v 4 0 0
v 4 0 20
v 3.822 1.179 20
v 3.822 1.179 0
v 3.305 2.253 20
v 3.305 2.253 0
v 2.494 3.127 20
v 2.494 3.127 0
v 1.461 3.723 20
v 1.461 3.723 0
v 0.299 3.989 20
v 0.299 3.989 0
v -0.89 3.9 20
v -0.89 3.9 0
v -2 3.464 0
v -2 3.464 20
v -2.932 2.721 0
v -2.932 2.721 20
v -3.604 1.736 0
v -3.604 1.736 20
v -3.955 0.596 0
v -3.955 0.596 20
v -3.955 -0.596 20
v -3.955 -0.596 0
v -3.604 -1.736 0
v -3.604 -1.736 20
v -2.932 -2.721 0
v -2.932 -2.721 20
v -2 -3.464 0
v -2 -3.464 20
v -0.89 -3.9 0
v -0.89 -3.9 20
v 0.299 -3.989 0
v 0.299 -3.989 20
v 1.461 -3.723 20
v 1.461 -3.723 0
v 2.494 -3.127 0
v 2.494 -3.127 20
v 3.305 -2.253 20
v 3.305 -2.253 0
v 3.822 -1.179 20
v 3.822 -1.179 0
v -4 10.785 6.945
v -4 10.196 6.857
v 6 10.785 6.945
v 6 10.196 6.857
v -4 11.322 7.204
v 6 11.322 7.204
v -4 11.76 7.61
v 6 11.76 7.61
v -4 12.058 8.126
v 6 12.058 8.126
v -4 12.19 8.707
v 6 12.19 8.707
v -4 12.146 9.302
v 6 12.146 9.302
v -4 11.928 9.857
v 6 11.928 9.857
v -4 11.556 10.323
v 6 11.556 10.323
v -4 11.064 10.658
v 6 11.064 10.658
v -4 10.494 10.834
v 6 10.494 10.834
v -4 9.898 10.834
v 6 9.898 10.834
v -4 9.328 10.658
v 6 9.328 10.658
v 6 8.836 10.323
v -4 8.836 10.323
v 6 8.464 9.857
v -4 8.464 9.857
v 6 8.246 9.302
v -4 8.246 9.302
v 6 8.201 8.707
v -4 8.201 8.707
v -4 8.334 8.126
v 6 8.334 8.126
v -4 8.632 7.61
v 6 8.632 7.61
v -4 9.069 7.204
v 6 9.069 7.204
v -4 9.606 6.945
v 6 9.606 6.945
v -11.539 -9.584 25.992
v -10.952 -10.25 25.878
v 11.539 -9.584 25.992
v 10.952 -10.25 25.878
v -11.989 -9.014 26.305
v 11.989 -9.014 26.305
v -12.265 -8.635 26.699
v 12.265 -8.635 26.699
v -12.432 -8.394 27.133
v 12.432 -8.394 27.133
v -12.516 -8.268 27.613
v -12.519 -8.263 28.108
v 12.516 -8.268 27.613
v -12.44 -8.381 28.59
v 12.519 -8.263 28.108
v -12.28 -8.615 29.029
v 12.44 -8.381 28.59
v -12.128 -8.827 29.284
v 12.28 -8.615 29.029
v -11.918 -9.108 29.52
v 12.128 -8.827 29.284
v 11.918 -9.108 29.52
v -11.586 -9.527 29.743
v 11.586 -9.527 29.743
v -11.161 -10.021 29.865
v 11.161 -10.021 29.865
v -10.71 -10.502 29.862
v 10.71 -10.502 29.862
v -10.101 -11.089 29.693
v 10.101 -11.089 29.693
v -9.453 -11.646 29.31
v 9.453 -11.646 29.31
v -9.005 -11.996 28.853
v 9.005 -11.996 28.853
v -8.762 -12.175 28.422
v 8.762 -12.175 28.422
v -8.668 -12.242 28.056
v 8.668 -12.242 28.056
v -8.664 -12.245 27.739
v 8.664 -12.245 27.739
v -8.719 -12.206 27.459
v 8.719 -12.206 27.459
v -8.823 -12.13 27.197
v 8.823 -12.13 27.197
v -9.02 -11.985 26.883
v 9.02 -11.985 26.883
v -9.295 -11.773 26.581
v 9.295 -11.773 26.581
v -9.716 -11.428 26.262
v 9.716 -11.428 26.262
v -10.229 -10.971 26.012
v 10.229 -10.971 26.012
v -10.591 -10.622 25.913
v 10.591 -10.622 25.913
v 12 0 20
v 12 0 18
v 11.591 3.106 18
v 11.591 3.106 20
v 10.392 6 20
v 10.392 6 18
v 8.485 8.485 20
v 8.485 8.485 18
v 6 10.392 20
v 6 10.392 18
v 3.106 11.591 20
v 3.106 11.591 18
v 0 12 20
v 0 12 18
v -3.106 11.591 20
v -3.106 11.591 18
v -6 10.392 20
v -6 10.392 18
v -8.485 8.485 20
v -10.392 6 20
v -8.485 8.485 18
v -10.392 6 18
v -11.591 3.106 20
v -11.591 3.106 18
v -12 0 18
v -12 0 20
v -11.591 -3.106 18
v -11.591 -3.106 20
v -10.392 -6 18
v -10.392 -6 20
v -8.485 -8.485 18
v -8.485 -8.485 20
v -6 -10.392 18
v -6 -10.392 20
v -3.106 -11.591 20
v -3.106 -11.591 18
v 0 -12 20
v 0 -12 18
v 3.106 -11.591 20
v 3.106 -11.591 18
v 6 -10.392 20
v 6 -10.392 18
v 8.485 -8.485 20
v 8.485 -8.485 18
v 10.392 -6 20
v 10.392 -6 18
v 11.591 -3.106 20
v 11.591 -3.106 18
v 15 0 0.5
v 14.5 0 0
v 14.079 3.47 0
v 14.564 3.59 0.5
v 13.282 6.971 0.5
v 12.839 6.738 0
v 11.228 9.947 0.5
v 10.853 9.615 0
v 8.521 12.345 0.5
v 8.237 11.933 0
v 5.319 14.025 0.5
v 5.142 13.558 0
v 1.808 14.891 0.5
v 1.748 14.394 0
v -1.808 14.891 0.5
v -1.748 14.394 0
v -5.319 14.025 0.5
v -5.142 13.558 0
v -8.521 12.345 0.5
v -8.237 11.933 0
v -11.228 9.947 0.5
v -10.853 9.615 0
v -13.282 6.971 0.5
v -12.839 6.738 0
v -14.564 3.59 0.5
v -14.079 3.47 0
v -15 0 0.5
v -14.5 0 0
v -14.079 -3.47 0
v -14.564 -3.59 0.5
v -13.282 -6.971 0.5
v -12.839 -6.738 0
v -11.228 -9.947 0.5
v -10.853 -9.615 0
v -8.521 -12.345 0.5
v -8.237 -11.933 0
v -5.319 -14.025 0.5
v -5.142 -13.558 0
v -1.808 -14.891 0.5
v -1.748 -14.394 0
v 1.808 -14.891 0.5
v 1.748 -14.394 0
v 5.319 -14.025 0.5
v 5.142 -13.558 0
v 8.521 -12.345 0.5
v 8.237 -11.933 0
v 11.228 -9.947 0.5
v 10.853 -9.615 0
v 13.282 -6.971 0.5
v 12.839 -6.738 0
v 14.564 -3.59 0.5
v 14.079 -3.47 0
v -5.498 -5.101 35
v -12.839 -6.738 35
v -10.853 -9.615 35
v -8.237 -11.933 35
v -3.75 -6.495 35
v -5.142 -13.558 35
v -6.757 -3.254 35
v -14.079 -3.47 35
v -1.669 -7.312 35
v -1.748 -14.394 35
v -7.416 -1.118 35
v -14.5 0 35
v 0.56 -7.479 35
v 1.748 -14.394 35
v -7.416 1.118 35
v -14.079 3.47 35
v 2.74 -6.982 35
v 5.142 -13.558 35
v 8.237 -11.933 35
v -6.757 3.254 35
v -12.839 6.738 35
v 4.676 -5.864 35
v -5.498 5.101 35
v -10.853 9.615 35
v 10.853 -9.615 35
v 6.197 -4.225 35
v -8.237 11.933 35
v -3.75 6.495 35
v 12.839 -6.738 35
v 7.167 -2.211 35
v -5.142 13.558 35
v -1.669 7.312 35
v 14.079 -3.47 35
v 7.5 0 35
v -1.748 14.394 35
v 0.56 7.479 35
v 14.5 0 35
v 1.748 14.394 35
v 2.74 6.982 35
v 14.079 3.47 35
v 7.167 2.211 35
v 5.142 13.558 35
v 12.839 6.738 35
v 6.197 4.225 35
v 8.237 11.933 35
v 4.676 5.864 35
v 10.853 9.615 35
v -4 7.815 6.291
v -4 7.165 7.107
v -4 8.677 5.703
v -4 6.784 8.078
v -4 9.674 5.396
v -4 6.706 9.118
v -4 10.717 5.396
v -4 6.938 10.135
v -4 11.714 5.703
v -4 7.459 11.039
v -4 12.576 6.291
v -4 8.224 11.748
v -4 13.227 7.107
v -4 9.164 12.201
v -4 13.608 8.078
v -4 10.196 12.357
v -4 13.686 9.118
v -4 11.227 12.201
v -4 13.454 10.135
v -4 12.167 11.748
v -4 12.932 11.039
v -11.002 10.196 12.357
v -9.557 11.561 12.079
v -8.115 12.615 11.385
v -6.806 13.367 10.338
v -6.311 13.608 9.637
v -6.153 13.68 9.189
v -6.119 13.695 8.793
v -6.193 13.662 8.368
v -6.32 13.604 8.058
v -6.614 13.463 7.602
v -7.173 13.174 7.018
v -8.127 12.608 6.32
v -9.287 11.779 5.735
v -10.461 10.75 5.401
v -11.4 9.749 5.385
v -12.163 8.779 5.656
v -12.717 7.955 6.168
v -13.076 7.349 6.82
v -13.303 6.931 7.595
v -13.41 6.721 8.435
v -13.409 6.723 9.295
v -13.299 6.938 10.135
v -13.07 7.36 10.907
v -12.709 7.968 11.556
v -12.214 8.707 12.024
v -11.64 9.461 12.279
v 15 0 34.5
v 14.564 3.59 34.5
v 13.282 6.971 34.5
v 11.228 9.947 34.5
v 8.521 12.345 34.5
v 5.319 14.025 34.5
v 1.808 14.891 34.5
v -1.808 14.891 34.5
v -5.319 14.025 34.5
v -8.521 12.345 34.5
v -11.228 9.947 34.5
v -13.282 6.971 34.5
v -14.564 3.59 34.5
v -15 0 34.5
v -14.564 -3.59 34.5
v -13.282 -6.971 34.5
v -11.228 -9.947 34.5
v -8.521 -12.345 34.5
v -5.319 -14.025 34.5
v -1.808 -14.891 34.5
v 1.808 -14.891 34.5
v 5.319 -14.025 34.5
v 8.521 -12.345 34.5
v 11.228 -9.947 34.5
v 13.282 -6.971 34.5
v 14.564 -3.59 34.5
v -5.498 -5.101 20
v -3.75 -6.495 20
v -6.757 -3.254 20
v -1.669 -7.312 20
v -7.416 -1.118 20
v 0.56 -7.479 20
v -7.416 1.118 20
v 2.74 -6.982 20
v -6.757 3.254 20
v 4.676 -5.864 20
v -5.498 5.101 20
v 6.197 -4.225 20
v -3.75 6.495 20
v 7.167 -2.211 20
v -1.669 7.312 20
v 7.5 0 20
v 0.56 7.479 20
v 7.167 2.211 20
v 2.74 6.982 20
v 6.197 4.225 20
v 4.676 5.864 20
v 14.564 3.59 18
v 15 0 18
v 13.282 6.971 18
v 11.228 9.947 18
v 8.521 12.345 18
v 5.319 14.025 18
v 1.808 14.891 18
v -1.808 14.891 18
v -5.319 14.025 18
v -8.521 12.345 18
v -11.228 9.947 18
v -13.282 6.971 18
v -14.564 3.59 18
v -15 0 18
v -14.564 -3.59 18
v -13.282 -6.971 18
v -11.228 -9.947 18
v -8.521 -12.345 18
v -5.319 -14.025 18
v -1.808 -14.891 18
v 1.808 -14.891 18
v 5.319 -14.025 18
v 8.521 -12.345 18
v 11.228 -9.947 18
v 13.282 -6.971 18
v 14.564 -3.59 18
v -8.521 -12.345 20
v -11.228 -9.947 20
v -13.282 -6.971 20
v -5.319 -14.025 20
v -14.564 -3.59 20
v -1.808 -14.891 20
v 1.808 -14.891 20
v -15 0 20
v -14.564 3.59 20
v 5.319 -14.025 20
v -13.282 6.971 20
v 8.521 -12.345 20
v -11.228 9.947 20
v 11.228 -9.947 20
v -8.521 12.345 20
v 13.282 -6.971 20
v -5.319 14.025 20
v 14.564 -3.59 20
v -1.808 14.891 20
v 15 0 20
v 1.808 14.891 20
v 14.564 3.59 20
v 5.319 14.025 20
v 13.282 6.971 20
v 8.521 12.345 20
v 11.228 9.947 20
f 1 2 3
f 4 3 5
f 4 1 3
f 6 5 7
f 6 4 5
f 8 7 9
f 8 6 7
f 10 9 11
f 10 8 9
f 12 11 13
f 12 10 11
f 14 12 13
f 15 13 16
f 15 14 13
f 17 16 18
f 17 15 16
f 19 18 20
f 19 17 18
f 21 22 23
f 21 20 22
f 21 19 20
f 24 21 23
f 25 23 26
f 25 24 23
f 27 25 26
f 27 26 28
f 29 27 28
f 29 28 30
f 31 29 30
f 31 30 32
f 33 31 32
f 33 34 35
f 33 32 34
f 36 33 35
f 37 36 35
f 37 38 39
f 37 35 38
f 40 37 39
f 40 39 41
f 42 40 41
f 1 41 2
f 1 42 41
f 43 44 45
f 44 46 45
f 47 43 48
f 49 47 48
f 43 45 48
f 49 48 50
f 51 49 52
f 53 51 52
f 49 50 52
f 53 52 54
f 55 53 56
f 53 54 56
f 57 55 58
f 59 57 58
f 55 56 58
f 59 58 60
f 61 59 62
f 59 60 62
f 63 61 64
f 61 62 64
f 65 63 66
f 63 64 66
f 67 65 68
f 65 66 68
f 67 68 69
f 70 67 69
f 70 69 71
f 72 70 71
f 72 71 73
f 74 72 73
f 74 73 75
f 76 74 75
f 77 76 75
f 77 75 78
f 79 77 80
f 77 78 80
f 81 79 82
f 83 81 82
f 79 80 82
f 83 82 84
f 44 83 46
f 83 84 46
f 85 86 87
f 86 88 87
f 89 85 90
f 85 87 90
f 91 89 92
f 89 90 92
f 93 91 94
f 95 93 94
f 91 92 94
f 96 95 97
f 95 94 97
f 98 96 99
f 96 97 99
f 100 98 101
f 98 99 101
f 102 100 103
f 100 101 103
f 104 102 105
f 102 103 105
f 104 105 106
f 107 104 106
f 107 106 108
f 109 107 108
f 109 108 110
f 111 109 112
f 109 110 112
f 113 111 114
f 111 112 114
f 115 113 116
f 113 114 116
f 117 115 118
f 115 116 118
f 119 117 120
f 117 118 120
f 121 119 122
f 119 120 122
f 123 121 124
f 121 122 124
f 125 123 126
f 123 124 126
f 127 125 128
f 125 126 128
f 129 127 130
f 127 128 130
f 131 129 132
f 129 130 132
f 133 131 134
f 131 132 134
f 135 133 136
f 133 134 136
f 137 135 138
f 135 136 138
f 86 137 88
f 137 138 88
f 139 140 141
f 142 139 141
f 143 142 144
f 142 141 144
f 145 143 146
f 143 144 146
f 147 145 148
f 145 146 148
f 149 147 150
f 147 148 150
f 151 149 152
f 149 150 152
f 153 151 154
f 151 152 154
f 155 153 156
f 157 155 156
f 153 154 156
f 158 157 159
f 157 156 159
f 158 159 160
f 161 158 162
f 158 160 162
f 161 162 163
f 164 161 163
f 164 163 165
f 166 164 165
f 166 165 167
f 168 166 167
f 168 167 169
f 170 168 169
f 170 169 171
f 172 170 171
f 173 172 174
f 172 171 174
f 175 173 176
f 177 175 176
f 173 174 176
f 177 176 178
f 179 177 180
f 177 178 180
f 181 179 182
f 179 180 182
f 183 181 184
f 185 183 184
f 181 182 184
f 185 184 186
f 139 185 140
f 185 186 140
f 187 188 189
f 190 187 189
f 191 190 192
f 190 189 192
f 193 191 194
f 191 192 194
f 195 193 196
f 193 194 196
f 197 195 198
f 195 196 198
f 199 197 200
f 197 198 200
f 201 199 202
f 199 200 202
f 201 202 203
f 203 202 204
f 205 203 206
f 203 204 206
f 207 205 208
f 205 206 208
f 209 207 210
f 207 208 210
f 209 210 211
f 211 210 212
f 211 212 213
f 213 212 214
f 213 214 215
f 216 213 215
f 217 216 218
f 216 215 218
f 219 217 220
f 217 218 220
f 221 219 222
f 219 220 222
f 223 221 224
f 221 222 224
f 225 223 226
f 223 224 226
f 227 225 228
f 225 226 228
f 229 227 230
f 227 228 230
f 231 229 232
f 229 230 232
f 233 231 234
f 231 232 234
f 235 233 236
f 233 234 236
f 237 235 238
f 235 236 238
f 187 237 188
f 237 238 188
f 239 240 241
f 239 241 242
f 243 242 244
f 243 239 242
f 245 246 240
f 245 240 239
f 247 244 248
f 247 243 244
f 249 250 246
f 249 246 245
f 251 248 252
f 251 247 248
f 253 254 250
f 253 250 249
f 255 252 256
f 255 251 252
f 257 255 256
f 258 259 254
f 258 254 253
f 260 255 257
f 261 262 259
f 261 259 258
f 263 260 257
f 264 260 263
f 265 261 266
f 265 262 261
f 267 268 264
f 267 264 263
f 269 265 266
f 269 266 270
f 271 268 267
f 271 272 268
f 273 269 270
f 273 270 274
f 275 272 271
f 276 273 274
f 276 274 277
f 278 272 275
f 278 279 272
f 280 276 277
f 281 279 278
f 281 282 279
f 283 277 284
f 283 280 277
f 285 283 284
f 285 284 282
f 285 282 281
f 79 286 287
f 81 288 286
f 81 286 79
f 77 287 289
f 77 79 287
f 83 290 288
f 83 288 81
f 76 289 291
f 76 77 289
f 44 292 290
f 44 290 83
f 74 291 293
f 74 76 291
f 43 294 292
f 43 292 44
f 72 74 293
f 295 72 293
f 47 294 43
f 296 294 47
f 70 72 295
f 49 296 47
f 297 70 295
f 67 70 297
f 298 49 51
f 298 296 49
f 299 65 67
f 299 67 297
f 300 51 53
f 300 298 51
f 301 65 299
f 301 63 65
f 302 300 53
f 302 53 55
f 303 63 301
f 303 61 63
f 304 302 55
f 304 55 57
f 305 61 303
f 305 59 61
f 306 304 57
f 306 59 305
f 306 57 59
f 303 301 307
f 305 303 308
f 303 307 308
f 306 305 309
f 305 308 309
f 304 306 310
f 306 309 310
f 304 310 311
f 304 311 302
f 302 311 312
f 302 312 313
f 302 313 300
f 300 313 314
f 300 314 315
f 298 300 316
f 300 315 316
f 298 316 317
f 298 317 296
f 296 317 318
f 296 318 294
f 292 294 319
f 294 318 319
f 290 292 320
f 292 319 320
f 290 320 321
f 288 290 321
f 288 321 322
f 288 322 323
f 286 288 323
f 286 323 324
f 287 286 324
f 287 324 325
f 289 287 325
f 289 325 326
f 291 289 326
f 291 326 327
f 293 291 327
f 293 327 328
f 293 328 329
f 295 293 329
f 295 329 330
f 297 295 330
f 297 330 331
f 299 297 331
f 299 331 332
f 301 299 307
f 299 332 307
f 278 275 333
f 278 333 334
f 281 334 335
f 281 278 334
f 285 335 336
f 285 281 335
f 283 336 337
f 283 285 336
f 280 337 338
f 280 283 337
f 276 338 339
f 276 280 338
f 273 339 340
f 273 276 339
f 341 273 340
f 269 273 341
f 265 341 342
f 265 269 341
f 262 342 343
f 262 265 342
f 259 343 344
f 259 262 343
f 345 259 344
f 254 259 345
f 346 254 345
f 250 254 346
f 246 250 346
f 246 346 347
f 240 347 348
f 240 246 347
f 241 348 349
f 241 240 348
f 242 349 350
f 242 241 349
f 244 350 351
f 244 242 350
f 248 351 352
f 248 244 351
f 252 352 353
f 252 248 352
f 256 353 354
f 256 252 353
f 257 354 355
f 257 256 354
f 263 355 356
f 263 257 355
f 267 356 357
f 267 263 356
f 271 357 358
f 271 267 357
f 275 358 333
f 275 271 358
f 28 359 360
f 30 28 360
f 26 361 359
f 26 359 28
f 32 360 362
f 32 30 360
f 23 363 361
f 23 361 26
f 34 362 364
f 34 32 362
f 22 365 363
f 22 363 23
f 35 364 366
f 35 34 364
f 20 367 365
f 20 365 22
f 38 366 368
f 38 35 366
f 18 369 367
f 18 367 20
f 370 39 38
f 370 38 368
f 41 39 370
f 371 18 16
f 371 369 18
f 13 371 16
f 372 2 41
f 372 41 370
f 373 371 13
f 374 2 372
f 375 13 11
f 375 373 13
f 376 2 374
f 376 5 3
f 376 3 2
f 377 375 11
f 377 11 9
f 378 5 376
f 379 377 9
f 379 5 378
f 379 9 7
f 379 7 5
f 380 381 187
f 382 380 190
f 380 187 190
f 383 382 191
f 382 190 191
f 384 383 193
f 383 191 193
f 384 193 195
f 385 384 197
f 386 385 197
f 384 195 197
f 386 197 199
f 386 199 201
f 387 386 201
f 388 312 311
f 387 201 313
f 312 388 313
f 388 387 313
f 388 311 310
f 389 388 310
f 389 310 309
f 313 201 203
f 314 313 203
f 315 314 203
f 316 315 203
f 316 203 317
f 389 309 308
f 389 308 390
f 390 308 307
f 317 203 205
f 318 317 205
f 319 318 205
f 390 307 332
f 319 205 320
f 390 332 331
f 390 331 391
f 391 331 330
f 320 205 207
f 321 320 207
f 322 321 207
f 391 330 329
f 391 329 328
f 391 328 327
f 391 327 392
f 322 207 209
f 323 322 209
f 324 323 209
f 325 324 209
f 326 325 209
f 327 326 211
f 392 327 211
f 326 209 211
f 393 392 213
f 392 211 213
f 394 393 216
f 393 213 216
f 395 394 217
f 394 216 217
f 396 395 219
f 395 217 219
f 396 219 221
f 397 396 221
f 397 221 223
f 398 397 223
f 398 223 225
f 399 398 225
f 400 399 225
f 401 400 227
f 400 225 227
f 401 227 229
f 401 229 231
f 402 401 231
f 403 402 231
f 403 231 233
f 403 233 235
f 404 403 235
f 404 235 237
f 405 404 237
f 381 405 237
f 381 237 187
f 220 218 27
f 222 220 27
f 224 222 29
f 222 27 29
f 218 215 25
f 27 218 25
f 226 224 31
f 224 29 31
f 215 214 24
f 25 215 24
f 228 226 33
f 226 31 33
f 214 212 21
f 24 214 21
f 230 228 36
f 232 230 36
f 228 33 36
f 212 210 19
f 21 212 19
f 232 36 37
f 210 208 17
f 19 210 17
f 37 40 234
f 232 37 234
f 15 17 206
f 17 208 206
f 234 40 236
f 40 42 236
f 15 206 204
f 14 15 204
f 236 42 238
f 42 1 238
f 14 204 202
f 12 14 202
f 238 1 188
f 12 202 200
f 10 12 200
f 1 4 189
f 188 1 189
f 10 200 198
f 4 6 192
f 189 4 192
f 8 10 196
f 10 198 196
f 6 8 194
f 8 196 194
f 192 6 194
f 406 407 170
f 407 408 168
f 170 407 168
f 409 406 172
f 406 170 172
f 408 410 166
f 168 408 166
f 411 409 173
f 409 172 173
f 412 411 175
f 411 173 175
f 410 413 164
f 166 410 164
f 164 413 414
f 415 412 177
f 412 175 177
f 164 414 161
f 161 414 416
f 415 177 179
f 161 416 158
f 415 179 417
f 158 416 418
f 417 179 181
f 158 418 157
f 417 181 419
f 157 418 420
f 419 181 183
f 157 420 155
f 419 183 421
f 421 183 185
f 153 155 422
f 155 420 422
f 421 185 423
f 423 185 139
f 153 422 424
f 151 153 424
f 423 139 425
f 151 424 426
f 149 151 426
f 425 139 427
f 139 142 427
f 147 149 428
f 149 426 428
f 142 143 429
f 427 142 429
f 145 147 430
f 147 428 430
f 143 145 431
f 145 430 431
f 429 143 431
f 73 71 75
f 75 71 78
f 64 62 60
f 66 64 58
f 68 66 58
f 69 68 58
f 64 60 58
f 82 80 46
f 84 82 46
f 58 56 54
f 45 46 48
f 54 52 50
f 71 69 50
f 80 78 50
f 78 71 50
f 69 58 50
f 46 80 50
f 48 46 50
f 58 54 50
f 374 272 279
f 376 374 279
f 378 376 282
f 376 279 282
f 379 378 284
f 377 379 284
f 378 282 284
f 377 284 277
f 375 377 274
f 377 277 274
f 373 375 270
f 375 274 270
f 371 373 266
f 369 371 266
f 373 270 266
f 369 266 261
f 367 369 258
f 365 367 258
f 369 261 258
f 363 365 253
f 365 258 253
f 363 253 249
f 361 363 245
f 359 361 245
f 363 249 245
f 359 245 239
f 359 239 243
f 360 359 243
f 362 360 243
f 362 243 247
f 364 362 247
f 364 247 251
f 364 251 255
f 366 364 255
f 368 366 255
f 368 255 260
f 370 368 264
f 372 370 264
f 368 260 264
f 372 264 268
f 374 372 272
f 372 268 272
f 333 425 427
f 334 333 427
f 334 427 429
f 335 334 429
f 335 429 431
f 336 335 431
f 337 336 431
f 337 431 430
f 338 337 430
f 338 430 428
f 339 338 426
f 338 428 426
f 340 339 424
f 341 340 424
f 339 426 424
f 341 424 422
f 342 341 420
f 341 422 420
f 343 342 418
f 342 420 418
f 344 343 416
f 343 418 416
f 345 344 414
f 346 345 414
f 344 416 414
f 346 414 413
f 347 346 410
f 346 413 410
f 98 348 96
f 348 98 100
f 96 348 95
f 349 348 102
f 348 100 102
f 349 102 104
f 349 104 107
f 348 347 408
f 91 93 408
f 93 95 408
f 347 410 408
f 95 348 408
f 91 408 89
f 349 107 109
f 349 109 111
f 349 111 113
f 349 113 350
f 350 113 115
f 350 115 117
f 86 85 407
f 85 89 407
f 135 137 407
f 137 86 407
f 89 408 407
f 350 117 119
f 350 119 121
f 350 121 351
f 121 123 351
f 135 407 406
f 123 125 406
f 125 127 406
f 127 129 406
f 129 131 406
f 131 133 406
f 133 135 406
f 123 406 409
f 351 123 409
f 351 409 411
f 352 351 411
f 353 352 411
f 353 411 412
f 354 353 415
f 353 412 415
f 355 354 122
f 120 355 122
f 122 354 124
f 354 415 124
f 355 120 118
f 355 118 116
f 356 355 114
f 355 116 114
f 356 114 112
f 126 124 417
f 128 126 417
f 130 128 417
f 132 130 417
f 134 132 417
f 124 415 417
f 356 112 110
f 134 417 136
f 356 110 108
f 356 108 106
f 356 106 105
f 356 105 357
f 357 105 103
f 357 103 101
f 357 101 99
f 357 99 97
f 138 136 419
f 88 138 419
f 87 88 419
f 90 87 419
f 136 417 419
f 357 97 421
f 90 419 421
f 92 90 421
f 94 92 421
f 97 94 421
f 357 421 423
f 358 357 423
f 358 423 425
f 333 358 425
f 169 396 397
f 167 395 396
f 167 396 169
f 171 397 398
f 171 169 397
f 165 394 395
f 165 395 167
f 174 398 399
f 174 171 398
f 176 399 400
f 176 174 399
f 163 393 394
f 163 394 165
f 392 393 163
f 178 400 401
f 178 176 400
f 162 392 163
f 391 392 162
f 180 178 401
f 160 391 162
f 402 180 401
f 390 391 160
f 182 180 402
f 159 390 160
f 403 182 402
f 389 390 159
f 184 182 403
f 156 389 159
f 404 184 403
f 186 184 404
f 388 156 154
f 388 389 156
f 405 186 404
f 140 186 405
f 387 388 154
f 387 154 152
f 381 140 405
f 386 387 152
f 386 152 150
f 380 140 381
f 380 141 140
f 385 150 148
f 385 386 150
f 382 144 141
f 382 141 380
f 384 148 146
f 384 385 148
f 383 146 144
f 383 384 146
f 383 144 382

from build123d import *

# Parameters (mm, degrees)
SKETCH_1_R          = 15
SKETCH_1_R_2        = 4
EXTRUDE_1_DEPTH     = 35
SKETCH_2_R          = 7.5
CUT_EXTRUDE_1_DEPTH = 15
SKETCH_3_R          = 2
CUT_EXTRUDE_2_DEPTH = 6
SKETCH_4_R          = 3.5
CUT_EXTRUDE_3_DEPTH = 10
CUT_EXTRUDE_START   = -2
SKETCH_5_R          = 15
SKETCH_5_R_2        = 12
CUT_EXTRUDE_4_DEPTH = 2
SKETCH_6_R          = 2
CUT_EXTRUDE_5_DEPTH = 20
CHAMFER_1_SIZE      = 0.5


with BuildPart() as part:
    # 草图1 → 凸台-拉伸1 (new body)
    with BuildSketch(Plane.XY):
        Circle(SKETCH_1_R)
        Circle(SKETCH_1_R_2, mode=Mode.SUBTRACT)
    extrude(amount=EXTRUDE_1_DEPTH)

    # 草图2 → 切除-拉伸1 (cut)
    with BuildSketch(Plane.XY.offset(35)):
        Circle(SKETCH_2_R)
    extrude(amount=-CUT_EXTRUDE_1_DEPTH, mode=Mode.SUBTRACT)

    # 草图3 → 切除-拉伸2 (cut, symmetric)
    with BuildSketch(Plane(origin=(0, 0, 0), x_dir=(0, 0, -1), z_dir=(1, 0, 0))):
        with Locations((-8.856511141, 10.195845598)):
            Circle(SKETCH_3_R)
    extrude(amount=CUT_EXTRUDE_2_DEPTH, both=True, mode=Mode.SUBTRACT)

    # 草图4 → 切除-拉伸3 (cut)
    with BuildSketch(Plane.ZY.offset(14)):
        with Locations((8.856511141, 10.195845598)):
            Circle(SKETCH_4_R)
    extrude(amount=-CUT_EXTRUDE_3_DEPTH, mode=Mode.SUBTRACT)

    # 草图5 → 切除-拉伸4 (cut)
    with BuildSketch(Plane.XY.offset(20).offset(CUT_EXTRUDE_START)):
        Circle(SKETCH_5_R)
        Circle(SKETCH_5_R_2, mode=Mode.SUBTRACT)
    extrude(amount=CUT_EXTRUDE_4_DEPTH, mode=Mode.SUBTRACT)

    # 草图6 → 切除-拉伸5 (cut, symmetric)
    with BuildSketch(Plane(origin=(0, 0, 0), x_dir=(0, 0, -1), z_dir=(1, 0, 0))):
        with Locations((-27.877925761, -10.249978731)):
            Circle(SKETCH_6_R)
    extrude(amount=CUT_EXTRUDE_5_DEPTH, both=True, mode=Mode.SUBTRACT)

    # 倒角1
    chamfer_1_edges = [part.edges().sort_by_distance(p)[0] for p in [
        (-15, 0, 0),
        (-15, 0, 35),
    ]]
    chamfer(chamfer_1_edges, length=CHAMFER_1_SIZE)


solid = part.part
